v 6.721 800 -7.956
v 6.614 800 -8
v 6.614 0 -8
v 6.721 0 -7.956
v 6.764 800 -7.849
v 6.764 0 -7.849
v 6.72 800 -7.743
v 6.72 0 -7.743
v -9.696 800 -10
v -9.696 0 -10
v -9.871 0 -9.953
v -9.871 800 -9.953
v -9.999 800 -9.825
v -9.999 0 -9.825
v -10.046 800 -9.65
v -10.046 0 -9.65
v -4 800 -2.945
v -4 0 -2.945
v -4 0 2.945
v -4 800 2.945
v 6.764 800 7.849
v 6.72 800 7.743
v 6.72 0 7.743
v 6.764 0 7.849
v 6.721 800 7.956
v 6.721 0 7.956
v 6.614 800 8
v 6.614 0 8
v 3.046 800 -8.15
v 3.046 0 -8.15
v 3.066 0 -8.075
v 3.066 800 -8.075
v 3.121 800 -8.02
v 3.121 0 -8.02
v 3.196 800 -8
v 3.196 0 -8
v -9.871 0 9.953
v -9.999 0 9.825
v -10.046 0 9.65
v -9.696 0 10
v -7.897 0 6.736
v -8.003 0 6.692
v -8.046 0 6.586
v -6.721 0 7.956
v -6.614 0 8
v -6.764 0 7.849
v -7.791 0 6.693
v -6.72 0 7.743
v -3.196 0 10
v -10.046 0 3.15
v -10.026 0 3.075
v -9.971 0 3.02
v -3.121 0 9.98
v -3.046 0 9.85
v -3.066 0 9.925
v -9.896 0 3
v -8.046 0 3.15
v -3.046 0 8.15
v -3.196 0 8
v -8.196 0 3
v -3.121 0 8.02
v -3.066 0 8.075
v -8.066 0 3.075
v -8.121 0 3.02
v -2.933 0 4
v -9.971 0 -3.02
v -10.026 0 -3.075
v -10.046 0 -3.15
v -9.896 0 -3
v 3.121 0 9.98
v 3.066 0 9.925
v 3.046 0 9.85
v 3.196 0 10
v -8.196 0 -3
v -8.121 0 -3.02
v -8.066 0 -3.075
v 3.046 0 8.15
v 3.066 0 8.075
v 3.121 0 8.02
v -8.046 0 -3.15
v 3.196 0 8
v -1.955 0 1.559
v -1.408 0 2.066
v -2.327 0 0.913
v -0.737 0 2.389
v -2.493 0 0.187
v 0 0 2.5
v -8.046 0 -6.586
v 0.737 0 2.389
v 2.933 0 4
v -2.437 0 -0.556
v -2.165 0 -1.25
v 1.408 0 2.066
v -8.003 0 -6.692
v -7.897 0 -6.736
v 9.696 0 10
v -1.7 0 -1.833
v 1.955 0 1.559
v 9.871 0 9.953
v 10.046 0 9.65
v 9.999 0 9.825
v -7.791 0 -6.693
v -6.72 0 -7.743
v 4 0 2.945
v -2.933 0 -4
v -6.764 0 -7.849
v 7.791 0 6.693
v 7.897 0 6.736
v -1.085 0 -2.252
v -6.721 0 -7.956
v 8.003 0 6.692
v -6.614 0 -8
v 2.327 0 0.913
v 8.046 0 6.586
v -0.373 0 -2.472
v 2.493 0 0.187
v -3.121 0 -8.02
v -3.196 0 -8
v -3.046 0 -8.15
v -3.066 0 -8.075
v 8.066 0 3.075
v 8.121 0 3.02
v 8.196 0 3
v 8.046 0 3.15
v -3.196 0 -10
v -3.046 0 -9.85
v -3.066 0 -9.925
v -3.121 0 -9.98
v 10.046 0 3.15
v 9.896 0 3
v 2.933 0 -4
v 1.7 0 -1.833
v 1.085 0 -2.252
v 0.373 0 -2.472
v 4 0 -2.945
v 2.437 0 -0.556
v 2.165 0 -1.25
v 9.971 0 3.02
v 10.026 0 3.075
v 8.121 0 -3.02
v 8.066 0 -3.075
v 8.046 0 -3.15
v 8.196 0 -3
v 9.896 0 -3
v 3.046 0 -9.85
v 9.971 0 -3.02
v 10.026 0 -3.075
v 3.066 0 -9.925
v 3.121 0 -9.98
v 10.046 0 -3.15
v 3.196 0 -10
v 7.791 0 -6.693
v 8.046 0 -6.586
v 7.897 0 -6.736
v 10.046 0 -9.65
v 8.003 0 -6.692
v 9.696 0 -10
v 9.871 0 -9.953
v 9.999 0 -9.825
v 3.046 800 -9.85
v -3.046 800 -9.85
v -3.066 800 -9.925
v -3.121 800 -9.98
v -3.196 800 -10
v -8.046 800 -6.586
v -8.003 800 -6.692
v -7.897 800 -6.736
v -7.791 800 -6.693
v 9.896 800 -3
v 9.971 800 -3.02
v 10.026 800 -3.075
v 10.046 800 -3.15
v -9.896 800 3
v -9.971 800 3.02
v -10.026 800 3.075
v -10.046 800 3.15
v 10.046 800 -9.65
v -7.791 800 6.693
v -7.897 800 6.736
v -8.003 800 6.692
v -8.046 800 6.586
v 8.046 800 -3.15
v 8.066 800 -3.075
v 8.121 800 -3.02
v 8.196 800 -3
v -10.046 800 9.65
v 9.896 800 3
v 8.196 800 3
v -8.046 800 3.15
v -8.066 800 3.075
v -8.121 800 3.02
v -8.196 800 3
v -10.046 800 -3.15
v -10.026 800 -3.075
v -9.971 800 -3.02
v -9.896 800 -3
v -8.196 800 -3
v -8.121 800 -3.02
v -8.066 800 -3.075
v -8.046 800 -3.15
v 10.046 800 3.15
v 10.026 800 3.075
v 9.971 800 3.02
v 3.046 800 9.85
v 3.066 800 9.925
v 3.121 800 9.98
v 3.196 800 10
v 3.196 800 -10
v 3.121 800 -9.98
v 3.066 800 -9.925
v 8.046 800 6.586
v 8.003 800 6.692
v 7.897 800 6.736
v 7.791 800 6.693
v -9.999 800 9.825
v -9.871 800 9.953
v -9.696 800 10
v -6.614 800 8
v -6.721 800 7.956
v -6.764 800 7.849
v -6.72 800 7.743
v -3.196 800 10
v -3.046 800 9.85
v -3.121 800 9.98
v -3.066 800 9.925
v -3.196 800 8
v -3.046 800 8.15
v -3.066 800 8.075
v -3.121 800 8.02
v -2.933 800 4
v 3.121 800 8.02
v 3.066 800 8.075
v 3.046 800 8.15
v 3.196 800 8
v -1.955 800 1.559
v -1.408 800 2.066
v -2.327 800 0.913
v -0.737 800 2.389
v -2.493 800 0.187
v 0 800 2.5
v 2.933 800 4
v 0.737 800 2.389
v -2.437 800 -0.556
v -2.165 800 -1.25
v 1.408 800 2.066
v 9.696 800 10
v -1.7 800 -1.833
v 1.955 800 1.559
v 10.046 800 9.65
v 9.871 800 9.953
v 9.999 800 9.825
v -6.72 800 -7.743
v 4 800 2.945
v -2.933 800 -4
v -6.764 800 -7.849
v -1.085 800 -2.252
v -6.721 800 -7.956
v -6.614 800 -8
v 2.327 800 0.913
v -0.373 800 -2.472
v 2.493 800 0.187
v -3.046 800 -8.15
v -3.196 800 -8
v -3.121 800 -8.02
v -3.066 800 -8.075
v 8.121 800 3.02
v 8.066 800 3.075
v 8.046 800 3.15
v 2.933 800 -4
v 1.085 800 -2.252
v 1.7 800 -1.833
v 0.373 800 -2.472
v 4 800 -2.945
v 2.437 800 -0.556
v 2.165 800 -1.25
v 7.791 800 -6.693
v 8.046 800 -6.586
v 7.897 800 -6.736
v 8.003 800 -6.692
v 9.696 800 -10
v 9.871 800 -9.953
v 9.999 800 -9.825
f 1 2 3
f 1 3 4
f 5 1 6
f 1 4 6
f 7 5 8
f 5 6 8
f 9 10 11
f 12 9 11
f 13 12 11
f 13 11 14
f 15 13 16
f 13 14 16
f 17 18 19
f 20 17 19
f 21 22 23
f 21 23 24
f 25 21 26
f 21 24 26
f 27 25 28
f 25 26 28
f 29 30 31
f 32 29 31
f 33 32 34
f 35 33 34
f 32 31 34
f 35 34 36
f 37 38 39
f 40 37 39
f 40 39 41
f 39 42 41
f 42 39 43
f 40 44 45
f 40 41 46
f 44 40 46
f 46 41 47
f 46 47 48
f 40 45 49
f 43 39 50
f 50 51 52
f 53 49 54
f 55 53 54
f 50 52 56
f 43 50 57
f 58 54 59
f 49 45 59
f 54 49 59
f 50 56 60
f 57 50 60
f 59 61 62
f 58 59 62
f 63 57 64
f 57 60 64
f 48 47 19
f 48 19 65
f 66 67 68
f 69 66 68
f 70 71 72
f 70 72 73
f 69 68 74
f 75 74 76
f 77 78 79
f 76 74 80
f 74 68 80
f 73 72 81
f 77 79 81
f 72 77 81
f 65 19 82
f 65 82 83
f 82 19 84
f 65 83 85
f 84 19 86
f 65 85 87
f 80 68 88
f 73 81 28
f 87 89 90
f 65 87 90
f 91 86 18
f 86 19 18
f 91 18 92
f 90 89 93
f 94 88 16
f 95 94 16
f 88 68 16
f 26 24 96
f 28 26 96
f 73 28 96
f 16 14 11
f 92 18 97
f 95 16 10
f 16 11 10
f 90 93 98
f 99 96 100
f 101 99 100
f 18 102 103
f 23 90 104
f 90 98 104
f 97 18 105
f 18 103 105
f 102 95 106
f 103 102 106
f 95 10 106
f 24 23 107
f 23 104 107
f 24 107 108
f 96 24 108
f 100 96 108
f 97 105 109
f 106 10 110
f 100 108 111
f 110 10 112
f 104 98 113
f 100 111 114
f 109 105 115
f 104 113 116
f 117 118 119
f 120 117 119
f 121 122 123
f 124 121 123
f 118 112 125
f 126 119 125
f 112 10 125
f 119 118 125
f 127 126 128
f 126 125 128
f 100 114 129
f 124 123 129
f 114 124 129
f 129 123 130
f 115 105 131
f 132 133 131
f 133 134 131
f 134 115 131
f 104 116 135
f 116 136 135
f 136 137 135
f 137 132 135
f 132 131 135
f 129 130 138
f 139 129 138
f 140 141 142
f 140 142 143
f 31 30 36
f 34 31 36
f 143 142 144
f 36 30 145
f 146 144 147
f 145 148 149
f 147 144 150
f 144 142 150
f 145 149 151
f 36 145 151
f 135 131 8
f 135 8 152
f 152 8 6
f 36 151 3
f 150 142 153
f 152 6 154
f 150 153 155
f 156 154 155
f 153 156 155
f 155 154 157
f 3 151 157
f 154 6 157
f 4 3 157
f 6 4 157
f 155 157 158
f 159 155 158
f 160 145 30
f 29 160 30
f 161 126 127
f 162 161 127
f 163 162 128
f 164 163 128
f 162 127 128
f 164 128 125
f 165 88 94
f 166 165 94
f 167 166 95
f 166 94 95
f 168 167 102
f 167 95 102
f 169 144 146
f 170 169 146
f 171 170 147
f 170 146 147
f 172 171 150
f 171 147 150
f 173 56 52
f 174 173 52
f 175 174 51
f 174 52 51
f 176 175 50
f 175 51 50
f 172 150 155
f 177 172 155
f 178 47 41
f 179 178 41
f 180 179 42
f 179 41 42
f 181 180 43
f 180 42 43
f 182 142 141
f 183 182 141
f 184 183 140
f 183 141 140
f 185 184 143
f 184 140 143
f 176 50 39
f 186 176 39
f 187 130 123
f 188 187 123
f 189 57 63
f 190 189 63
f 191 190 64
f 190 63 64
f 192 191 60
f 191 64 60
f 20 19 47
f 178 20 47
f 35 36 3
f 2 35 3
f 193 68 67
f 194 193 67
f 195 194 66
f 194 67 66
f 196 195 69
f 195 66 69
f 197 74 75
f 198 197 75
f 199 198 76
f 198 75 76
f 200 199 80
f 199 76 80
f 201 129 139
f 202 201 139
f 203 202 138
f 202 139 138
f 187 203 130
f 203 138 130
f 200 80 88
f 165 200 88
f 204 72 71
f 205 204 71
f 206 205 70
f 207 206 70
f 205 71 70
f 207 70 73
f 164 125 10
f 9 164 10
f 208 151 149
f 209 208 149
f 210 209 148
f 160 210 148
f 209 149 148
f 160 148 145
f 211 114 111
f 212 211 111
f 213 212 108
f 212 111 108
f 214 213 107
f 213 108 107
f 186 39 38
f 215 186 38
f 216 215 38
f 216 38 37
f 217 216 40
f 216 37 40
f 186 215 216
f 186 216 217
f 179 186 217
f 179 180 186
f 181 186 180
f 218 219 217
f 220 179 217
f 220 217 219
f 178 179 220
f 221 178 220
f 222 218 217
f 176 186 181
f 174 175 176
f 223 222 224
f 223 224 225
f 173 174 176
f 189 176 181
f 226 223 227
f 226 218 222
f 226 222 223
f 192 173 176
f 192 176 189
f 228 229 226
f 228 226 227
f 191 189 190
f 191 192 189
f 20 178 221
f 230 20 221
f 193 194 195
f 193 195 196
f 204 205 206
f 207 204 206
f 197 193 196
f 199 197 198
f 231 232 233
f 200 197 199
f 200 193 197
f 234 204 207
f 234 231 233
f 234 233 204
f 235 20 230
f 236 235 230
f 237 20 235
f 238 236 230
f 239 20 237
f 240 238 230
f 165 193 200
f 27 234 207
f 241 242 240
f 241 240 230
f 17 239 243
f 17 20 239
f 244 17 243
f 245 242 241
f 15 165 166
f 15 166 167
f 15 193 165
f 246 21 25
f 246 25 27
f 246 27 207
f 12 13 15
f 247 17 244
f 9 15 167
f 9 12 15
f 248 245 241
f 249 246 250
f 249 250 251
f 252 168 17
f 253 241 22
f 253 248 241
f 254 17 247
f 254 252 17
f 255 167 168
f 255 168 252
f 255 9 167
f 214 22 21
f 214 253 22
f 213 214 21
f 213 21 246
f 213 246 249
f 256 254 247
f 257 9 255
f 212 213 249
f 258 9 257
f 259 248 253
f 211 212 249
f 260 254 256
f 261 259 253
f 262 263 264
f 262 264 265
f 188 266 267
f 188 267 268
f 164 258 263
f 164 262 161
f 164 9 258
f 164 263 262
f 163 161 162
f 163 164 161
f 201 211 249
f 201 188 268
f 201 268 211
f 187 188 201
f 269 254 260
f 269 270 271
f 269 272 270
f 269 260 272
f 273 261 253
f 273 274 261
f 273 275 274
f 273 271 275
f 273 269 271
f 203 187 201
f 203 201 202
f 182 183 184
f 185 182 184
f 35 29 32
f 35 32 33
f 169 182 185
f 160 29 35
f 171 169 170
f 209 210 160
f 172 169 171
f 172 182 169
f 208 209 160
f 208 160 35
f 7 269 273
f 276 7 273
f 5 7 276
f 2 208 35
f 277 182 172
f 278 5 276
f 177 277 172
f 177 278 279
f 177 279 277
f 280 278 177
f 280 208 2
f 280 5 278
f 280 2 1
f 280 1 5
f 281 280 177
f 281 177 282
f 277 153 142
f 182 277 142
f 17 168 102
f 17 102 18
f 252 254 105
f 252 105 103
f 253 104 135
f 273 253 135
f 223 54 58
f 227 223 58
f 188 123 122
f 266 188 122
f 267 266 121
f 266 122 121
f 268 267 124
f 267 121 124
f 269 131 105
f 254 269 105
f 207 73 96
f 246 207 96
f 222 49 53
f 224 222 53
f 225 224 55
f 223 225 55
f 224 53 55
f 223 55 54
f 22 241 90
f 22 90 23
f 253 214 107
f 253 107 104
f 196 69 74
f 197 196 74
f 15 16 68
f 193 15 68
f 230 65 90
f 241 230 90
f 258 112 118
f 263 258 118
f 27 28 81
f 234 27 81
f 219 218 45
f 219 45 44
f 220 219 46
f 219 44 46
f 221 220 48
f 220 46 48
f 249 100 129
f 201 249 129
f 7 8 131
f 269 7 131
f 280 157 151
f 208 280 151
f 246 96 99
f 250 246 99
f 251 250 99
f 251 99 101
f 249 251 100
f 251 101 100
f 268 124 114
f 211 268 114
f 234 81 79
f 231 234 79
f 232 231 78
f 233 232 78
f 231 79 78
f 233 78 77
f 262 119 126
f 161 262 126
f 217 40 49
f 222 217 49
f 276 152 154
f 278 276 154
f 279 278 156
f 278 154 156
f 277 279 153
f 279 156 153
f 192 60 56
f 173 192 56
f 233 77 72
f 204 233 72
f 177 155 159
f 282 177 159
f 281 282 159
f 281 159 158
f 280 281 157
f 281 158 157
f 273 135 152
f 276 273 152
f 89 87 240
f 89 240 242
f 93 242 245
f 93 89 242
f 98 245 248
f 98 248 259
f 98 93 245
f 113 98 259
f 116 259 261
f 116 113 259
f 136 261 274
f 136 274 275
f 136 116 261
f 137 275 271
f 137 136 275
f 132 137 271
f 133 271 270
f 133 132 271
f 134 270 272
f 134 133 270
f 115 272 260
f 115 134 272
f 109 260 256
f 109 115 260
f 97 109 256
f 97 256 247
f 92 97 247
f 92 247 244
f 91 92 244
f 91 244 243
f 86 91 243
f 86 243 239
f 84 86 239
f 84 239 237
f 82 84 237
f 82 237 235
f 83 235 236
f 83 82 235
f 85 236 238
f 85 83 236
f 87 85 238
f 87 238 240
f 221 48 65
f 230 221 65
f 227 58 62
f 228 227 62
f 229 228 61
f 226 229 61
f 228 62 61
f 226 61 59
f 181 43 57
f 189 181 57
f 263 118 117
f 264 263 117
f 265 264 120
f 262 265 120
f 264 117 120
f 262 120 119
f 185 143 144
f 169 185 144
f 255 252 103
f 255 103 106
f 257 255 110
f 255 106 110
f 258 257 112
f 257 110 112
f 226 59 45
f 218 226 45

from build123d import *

# Parameters (mm, degrees)
SKETCH1_R           = 2.5
BOSS_EXTRUDE2_DEPTH = 800


with BuildPart() as part:
    # Sketch1 → Boss-Extrude2 (new body)
    with BuildSketch(Plane(origin=(0, 0, 0), x_dir=(1, 0, 0), z_dir=(0, 1, 0))):
        with BuildLine():
            Line((-9.896296296, 3), (-8.196296296, 3))
            ThreePointArc((-8.196296296, 3), (-8.090230279, 3.043933983), (-8.046296296, 3.15))
            Line((-8.046296296, 3.15), (-8.046296296, 6.586184513))
            ThreePointArc((-8.046296296, 6.586184513), (-7.954097251, 6.724600732), (-7.790842301, 6.692859041))
            Line((-7.790842301, 6.692859041), (-4, 2.945390222))
            Line((-4, 2.945390222), (-4, -2.945390222))
            Line((-4, -2.945390222), (-7.790842301, -6.692859041))
            ThreePointArc((-7.790842301, -6.692859041), (-7.954097251, -6.724600732), (-8.046296296, -6.586184513))
            Line((-8.046296296, -6.586184513), (-8.046296296, -3.15))
            ThreePointArc((-8.046296296, -3.15), (-8.090230279, -3.043933983), (-8.196296296, -3))
            Line((-8.196296296, -3), (-9.896296296, -3))
            ThreePointArc((-9.896296296, -3), (-10.002362313, -3.043933983), (-10.046296296, -3.15))
            Line((-10.046296296, -3.15), (-10.046296296, -9.65))
            ThreePointArc((-10.046296296, -9.65), (-9.94378367, -9.897487373), (-9.696296296, -10))
            Line((-9.696296296, -10), (-3.196296296, -10))
            ThreePointArc((-3.196296296, -10), (-3.090230279, -9.956066017), (-3.046296296, -9.85))
            Line((-3.046296296, -9.85), (-3.046296296, -8.15))
            ThreePointArc((-3.046296296, -8.15), (-3.090230279, -8.043933983), (-3.196296296, -8))
            Line((-3.196296296, -8), (-6.614381093, -8))
            ThreePointArc((-6.614381093, -8), (-6.753127587, -7.9070036), (-6.719835089, -7.743325472))
            Line((-6.719835089, -7.743325472), (-2.93318409, -4))
            Line((-2.93318409, -4), (2.93318409, -4))
            Line((2.93318409, -4), (6.719835089, -7.743325472))
            ThreePointArc((6.719835089, -7.743325472), (6.753127587, -7.9070036), (6.614381093, -8))
            Line((6.614381093, -8), (3.196296296, -8))
            ThreePointArc((3.196296296, -8), (3.090230279, -8.043933983), (3.046296296, -8.15))
            Line((3.046296296, -8.15), (3.046296296, -9.85))
            ThreePointArc((3.046296296, -9.85), (3.090230279, -9.956066017), (3.196296296, -10))
            Line((3.196296296, -10), (9.696296296, -10))
            ThreePointArc((9.696296296, -10), (9.94378367, -9.897487373), (10.046296296, -9.65))
            Line((10.046296296, -9.65), (10.046296296, -3.15))
            ThreePointArc((10.046296296, -3.15), (10.002362313, -3.043933983), (9.896296296, -3))
            Line((9.896296296, -3), (8.196296296, -3))
            ThreePointArc((8.196296296, -3), (8.090230279, -3.043933983), (8.046296296, -3.15))
            Line((8.046296296, -3.15), (8.046296296, -6.586184513))
            ThreePointArc((8.046296296, -6.586184513), (7.954097251, -6.724600732), (7.790842301, -6.692859041))
            Line((7.790842301, -6.692859041), (4, -2.945390222))
            Line((4, -2.945390222), (4, 2.945390222))
            Line((4, 2.945390222), (7.790842301, 6.692859041))
            ThreePointArc((7.790842301, 6.692859041), (7.954097251, 6.724600732), (8.046296296, 6.586184513))
            Line((8.046296296, 6.586184513), (8.046296296, 3.15))
            ThreePointArc((8.046296296, 3.15), (8.090230279, 3.043933983), (8.196296296, 3))
            Line((8.196296296, 3), (9.896296296, 3))
            ThreePointArc((9.896296296, 3), (10.002362313, 3.043933983), (10.046296296, 3.15))
            Line((10.046296296, 3.15), (10.046296296, 9.65))
            ThreePointArc((10.046296296, 9.65), (9.94378367, 9.897487373), (9.696296296, 10))
            Line((9.696296296, 10), (3.196296296, 10))
            ThreePointArc((3.196296296, 10), (3.090230279, 9.956066017), (3.046296296, 9.85))
            Line((3.046296296, 9.85), (3.046296296, 8.15))
            ThreePointArc((3.046296296, 8.15), (3.090230279, 8.043933983), (3.196296296, 8))
            Line((3.196296296, 8), (6.614381093, 8))
            ThreePointArc((6.614381093, 8), (6.753127587, 7.9070036), (6.719835089, 7.743325472))
            Line((6.719835089, 7.743325472), (2.93318409, 4))
            Line((2.93318409, 4), (-2.93318409, 4))
            Line((-2.93318409, 4), (-6.719835089, 7.743325472))
            ThreePointArc((-6.719835089, 7.743325472), (-6.753127587, 7.9070036), (-6.614381093, 8))
            Line((-6.614381093, 8), (-3.196296296, 8))
            ThreePointArc((-3.196296296, 8), (-3.090230279, 8.043933983), (-3.046296296, 8.15))
            Line((-3.046296296, 8.15), (-3.046296296, 9.85))
            ThreePointArc((-3.046296296, 9.85), (-3.090230279, 9.956066017), (-3.196296296, 10))
            Line((-3.196296296, 10), (-9.696296296, 10))
            ThreePointArc((-9.696296296, 10), (-9.94378367, 9.897487373), (-10.046296296, 9.65))
            Line((-10.046296296, 9.65), (-10.046296296, 3.15))
            ThreePointArc((-10.046296296, 3.15), (-10.002362313, 3.043933983), (-9.896296296, 3))
        make_face()
        with Locations(Location((0, 0, 0), (0, 0, 270))):
            Circle(SKETCH1_R, mode=Mode.SUBTRACT)
    extrude(amount=BOSS_EXTRUDE2_DEPTH)


solid = part.part
